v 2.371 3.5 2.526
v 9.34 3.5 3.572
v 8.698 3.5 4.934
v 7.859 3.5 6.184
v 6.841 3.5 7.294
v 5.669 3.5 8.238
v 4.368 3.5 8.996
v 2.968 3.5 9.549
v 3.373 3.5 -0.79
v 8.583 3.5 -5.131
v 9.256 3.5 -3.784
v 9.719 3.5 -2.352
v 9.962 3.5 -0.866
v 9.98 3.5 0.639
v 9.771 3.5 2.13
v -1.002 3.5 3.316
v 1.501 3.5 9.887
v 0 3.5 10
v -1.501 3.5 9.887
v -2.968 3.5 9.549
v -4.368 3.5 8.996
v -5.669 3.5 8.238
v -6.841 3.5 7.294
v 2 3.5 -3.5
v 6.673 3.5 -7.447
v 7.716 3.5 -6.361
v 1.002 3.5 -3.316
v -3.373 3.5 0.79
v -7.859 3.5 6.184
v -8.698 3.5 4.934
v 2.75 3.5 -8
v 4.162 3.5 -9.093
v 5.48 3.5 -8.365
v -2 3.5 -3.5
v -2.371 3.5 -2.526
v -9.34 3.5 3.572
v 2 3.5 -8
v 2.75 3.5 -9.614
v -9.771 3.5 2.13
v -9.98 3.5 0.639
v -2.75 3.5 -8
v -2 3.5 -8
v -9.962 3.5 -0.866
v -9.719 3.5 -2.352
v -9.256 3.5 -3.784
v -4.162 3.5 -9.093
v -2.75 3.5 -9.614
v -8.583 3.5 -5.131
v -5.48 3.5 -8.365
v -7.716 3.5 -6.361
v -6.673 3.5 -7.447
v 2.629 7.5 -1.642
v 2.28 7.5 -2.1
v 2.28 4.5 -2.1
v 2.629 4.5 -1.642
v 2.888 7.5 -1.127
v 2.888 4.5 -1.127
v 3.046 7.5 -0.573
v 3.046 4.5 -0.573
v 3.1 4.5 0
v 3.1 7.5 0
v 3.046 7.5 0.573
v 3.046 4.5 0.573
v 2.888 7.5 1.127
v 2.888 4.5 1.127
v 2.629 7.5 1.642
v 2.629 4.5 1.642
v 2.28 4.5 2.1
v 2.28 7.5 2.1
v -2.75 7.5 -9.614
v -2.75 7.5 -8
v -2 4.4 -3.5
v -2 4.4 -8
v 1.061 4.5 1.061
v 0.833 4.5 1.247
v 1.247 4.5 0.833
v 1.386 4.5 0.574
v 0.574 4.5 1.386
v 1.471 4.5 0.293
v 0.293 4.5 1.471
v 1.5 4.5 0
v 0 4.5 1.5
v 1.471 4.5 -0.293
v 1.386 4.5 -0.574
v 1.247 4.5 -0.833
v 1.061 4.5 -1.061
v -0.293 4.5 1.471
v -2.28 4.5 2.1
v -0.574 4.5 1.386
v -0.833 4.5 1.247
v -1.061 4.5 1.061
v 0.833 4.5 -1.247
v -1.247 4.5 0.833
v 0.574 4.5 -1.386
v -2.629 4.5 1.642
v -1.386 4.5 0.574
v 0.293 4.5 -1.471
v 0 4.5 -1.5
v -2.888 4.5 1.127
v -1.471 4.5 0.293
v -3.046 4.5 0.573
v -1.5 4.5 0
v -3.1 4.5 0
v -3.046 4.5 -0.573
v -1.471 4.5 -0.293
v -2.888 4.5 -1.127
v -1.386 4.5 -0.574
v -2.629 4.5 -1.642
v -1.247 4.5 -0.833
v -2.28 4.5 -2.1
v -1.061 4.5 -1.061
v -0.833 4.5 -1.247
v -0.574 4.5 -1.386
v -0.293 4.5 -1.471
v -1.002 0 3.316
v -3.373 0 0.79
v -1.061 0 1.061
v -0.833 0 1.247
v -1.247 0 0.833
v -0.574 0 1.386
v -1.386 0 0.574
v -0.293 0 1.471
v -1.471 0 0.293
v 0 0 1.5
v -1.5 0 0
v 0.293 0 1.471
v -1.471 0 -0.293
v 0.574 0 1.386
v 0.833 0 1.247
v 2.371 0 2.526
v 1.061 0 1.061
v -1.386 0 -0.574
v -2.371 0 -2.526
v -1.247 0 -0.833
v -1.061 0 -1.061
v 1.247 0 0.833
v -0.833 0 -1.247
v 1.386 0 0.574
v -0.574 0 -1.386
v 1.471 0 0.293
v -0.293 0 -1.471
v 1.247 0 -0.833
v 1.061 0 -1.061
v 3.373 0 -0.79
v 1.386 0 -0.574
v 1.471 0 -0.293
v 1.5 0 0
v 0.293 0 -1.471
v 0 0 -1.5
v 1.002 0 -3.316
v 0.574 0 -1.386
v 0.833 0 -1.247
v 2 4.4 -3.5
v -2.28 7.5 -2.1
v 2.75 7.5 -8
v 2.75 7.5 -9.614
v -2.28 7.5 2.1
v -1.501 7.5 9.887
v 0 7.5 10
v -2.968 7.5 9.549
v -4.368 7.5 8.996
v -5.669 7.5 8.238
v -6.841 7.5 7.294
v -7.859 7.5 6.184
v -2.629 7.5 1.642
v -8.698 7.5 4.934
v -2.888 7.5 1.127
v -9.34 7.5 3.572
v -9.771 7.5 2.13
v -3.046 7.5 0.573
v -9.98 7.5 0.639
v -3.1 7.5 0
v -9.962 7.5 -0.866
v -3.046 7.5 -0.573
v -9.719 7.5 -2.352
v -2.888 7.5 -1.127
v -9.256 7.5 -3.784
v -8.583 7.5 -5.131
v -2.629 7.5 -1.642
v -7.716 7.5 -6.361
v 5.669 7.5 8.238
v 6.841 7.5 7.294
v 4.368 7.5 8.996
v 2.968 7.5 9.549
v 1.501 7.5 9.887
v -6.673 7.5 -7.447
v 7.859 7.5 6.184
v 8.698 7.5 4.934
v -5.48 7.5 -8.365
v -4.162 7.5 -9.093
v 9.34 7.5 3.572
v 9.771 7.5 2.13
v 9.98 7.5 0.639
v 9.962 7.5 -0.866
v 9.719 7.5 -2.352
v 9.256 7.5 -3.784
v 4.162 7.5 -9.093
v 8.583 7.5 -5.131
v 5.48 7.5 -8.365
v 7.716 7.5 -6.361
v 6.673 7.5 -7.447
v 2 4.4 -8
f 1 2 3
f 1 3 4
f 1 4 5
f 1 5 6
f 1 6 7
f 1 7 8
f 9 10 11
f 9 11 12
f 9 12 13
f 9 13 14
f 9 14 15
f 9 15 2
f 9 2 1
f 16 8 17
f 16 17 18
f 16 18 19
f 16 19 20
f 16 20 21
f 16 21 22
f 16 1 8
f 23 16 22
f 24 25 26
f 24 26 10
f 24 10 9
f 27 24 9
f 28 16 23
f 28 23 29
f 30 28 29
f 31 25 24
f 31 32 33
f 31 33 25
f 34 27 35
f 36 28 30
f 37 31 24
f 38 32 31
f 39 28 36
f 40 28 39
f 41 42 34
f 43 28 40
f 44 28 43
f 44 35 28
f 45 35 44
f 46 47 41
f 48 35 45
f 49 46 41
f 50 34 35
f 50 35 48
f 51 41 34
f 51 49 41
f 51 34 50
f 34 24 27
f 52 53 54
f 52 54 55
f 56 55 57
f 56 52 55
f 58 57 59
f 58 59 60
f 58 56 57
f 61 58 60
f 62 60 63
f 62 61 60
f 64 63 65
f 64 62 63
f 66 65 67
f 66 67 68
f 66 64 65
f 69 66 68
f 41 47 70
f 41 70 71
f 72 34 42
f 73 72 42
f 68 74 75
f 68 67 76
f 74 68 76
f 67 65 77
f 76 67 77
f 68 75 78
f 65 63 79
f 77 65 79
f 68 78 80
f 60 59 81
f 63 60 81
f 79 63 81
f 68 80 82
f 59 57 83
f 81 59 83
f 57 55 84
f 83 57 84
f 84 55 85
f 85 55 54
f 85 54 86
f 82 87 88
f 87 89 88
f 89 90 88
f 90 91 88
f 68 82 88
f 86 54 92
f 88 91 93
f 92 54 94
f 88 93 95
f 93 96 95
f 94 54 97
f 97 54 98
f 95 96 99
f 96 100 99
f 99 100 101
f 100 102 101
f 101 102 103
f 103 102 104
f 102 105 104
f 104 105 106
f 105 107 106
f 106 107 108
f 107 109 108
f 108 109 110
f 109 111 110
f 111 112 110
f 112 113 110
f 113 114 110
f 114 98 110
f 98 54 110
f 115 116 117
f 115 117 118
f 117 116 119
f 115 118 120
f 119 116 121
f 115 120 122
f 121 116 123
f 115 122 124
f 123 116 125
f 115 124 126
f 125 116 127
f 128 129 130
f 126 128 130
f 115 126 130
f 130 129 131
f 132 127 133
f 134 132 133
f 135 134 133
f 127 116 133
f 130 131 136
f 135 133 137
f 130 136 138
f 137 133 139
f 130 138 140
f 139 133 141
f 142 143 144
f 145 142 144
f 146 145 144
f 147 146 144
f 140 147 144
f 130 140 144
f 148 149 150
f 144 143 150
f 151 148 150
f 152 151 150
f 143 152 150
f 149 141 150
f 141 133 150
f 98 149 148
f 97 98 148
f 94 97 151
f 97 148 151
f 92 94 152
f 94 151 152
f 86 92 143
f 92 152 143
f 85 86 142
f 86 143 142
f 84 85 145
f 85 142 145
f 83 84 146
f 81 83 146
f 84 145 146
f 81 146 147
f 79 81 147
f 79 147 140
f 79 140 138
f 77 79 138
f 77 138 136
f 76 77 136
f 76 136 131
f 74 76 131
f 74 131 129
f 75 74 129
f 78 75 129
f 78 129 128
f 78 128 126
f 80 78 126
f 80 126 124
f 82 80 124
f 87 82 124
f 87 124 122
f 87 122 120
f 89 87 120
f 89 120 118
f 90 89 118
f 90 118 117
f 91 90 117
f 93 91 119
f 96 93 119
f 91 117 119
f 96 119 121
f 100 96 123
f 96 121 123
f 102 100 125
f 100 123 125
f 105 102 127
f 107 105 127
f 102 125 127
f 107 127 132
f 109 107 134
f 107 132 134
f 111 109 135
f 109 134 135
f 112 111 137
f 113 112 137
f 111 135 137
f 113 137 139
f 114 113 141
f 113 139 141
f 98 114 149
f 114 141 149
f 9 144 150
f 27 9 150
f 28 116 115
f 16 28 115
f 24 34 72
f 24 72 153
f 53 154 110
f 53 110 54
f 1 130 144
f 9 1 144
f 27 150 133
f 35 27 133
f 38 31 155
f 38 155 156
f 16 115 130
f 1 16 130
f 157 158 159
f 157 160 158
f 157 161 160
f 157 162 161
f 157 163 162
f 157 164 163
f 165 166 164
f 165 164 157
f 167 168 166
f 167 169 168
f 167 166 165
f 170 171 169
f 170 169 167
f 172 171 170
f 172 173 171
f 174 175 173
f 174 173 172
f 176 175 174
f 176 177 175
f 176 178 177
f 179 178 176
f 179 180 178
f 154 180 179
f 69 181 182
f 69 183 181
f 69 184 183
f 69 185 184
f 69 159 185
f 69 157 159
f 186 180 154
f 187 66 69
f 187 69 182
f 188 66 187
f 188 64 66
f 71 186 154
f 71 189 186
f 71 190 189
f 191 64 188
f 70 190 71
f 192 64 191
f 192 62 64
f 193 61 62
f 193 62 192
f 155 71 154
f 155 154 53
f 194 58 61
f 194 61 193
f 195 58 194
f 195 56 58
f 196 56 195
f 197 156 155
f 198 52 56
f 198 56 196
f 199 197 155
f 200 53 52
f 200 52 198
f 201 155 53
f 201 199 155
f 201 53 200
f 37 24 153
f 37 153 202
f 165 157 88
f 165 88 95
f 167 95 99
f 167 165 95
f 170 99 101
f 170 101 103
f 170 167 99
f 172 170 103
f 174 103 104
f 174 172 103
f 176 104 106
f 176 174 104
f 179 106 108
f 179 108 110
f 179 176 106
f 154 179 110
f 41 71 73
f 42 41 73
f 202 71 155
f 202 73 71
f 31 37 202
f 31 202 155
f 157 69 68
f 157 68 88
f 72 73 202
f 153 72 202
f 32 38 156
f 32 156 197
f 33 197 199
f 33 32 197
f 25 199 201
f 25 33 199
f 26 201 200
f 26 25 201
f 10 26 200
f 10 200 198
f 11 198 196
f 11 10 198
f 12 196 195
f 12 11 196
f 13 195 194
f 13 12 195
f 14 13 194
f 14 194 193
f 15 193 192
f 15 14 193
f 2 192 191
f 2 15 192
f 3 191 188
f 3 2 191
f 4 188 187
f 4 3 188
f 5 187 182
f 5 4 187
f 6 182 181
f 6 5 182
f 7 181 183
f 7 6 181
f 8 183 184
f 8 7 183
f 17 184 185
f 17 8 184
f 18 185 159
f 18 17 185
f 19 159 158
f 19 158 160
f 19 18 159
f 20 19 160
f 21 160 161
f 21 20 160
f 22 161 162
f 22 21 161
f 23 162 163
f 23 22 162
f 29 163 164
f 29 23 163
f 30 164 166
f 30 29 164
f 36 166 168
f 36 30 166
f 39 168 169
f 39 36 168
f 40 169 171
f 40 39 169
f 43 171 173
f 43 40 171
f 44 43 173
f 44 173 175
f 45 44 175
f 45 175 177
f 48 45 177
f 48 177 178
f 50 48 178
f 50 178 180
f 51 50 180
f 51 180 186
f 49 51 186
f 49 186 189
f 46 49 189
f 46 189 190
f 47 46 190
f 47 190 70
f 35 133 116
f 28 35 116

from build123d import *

# Parameters (mm, degrees)
EXTRUDE_1_DEPTH     = 3.5
EXTRUDE_2_DEPTH     = 4
SKETCH_4_R          = 1.5
CUT_EXTRUDE_1_DEPTH = 4
CUT_EXTRUDE_2_DEPTH = 3
SKETCH_6_R          = 1.5
CUT_EXTRUDE_3_DEPTH = 17.007810594
SKETCH_7_W          = 4
SKETCH_7_H          = 4.5
CUT_EXTRUDE_4_DEPTH = 0.9
SKETCH_8_W          = 4
SKETCH_8_H          = 4.5
EXTRUDE_3_DEPTH     = 0.9


with BuildPart() as part:
    # 草图1 → 凸台-拉伸1 (new body)
    with BuildSketch(Plane(origin=(0, 0, 0), x_dir=(1, 0, 0), z_dir=(0, 1, 0))):
        Polygon((2.370649369, -2.525870458), (3.372792668, 0.790107348), (1.002143299, 3.315977806), (-2.370649369, 2.525870458), (-3.372792668, -0.790107348), (-1.002143299, -3.315977806), align=None)
    extrude(amount=EXTRUDE_1_DEPTH)

    # 草图3 → 凸台-拉伸2 (add)
    with BuildSketch(Plane(origin=(0, 3.5, 0), x_dir=(1, 0, 0), z_dir=(0, 1, 0))):
        with BuildLine():
            Line((-2.75, 8), (2.75, 8))
            Line((2.75, 8), (2.75, 9.614442262))
            ThreePointArc((2.75, 9.614442262), (0, -10), (-2.75, 9.614442262))
            Line((-2.75, 9.614442262), (-2.75, 8))
        make_face()
    extrude(amount=EXTRUDE_2_DEPTH)

    # 草图4 → 切除-拉伸1 (cut)
    with BuildSketch(Plane.XZ):
        with Locations(Location((0, 0, 0), (0, 0, 270))):
            Circle(SKETCH_4_R)
    extrude(amount=-CUT_EXTRUDE_1_DEPTH, mode=Mode.SUBTRACT)

    # 草图5 → 切除-拉伸2 (cut)
    with BuildSketch(Plane(origin=(0, 7.5, 0), x_dir=(1, 0, 0), z_dir=(0, 1, 0))):
        with BuildLine():
            Line((-2.28035085, 2.1), (2.28035085, 2.1))
            ThreePointArc((2.28035085, 2.1), (3.1, 0), (2.28035085, -2.1))
            Line((2.28035085, -2.1), (-2.28035085, -2.1))
            ThreePointArc((-2.28035085, -2.1), (-3.1, 0), (-2.28035085, 2.1))
        make_face()
    extrude(amount=-CUT_EXTRUDE_2_DEPTH, mode=Mode.SUBTRACT)

    # 草图6 → 切除-拉伸3 (cut, through all)
    with BuildSketch(Plane.XZ):
        with Locations(Location((0, 0, 0), (0, 0, 270))):
            Circle(SKETCH_6_R)
    extrude(amount=-CUT_EXTRUDE_3_DEPTH, mode=Mode.SUBTRACT)

    # 草图7 → 切除-拉伸4 (cut)
    with BuildSketch(Plane(origin=(0, 7.5, 0), x_dir=(1, 0, 0), z_dir=(0, 1, 0))):
        with Locations((0, 5.75)):
            Rectangle(SKETCH_7_W, SKETCH_7_H)
    cut_extrude_4 = extrude(amount=-CUT_EXTRUDE_4_DEPTH, mode=Mode.SUBTRACT)

    # 镜向1: 切除-拉伸4 across plane
    add(cut_extrude_4.mirror(Plane.ZX.offset(5.5)), mode=Mode.SUBTRACT)

    # 草图8 → 凸台-拉伸3 (add)
    with BuildSketch(Plane(origin=(0, 6.6, 0), x_dir=(1, 0, 0), z_dir=(0, 1, 0))):
        with Locations((0, 5.75)):
            Rectangle(SKETCH_8_W, SKETCH_8_H)
    extrude(amount=EXTRUDE_3_DEPTH)


solid = part.part
